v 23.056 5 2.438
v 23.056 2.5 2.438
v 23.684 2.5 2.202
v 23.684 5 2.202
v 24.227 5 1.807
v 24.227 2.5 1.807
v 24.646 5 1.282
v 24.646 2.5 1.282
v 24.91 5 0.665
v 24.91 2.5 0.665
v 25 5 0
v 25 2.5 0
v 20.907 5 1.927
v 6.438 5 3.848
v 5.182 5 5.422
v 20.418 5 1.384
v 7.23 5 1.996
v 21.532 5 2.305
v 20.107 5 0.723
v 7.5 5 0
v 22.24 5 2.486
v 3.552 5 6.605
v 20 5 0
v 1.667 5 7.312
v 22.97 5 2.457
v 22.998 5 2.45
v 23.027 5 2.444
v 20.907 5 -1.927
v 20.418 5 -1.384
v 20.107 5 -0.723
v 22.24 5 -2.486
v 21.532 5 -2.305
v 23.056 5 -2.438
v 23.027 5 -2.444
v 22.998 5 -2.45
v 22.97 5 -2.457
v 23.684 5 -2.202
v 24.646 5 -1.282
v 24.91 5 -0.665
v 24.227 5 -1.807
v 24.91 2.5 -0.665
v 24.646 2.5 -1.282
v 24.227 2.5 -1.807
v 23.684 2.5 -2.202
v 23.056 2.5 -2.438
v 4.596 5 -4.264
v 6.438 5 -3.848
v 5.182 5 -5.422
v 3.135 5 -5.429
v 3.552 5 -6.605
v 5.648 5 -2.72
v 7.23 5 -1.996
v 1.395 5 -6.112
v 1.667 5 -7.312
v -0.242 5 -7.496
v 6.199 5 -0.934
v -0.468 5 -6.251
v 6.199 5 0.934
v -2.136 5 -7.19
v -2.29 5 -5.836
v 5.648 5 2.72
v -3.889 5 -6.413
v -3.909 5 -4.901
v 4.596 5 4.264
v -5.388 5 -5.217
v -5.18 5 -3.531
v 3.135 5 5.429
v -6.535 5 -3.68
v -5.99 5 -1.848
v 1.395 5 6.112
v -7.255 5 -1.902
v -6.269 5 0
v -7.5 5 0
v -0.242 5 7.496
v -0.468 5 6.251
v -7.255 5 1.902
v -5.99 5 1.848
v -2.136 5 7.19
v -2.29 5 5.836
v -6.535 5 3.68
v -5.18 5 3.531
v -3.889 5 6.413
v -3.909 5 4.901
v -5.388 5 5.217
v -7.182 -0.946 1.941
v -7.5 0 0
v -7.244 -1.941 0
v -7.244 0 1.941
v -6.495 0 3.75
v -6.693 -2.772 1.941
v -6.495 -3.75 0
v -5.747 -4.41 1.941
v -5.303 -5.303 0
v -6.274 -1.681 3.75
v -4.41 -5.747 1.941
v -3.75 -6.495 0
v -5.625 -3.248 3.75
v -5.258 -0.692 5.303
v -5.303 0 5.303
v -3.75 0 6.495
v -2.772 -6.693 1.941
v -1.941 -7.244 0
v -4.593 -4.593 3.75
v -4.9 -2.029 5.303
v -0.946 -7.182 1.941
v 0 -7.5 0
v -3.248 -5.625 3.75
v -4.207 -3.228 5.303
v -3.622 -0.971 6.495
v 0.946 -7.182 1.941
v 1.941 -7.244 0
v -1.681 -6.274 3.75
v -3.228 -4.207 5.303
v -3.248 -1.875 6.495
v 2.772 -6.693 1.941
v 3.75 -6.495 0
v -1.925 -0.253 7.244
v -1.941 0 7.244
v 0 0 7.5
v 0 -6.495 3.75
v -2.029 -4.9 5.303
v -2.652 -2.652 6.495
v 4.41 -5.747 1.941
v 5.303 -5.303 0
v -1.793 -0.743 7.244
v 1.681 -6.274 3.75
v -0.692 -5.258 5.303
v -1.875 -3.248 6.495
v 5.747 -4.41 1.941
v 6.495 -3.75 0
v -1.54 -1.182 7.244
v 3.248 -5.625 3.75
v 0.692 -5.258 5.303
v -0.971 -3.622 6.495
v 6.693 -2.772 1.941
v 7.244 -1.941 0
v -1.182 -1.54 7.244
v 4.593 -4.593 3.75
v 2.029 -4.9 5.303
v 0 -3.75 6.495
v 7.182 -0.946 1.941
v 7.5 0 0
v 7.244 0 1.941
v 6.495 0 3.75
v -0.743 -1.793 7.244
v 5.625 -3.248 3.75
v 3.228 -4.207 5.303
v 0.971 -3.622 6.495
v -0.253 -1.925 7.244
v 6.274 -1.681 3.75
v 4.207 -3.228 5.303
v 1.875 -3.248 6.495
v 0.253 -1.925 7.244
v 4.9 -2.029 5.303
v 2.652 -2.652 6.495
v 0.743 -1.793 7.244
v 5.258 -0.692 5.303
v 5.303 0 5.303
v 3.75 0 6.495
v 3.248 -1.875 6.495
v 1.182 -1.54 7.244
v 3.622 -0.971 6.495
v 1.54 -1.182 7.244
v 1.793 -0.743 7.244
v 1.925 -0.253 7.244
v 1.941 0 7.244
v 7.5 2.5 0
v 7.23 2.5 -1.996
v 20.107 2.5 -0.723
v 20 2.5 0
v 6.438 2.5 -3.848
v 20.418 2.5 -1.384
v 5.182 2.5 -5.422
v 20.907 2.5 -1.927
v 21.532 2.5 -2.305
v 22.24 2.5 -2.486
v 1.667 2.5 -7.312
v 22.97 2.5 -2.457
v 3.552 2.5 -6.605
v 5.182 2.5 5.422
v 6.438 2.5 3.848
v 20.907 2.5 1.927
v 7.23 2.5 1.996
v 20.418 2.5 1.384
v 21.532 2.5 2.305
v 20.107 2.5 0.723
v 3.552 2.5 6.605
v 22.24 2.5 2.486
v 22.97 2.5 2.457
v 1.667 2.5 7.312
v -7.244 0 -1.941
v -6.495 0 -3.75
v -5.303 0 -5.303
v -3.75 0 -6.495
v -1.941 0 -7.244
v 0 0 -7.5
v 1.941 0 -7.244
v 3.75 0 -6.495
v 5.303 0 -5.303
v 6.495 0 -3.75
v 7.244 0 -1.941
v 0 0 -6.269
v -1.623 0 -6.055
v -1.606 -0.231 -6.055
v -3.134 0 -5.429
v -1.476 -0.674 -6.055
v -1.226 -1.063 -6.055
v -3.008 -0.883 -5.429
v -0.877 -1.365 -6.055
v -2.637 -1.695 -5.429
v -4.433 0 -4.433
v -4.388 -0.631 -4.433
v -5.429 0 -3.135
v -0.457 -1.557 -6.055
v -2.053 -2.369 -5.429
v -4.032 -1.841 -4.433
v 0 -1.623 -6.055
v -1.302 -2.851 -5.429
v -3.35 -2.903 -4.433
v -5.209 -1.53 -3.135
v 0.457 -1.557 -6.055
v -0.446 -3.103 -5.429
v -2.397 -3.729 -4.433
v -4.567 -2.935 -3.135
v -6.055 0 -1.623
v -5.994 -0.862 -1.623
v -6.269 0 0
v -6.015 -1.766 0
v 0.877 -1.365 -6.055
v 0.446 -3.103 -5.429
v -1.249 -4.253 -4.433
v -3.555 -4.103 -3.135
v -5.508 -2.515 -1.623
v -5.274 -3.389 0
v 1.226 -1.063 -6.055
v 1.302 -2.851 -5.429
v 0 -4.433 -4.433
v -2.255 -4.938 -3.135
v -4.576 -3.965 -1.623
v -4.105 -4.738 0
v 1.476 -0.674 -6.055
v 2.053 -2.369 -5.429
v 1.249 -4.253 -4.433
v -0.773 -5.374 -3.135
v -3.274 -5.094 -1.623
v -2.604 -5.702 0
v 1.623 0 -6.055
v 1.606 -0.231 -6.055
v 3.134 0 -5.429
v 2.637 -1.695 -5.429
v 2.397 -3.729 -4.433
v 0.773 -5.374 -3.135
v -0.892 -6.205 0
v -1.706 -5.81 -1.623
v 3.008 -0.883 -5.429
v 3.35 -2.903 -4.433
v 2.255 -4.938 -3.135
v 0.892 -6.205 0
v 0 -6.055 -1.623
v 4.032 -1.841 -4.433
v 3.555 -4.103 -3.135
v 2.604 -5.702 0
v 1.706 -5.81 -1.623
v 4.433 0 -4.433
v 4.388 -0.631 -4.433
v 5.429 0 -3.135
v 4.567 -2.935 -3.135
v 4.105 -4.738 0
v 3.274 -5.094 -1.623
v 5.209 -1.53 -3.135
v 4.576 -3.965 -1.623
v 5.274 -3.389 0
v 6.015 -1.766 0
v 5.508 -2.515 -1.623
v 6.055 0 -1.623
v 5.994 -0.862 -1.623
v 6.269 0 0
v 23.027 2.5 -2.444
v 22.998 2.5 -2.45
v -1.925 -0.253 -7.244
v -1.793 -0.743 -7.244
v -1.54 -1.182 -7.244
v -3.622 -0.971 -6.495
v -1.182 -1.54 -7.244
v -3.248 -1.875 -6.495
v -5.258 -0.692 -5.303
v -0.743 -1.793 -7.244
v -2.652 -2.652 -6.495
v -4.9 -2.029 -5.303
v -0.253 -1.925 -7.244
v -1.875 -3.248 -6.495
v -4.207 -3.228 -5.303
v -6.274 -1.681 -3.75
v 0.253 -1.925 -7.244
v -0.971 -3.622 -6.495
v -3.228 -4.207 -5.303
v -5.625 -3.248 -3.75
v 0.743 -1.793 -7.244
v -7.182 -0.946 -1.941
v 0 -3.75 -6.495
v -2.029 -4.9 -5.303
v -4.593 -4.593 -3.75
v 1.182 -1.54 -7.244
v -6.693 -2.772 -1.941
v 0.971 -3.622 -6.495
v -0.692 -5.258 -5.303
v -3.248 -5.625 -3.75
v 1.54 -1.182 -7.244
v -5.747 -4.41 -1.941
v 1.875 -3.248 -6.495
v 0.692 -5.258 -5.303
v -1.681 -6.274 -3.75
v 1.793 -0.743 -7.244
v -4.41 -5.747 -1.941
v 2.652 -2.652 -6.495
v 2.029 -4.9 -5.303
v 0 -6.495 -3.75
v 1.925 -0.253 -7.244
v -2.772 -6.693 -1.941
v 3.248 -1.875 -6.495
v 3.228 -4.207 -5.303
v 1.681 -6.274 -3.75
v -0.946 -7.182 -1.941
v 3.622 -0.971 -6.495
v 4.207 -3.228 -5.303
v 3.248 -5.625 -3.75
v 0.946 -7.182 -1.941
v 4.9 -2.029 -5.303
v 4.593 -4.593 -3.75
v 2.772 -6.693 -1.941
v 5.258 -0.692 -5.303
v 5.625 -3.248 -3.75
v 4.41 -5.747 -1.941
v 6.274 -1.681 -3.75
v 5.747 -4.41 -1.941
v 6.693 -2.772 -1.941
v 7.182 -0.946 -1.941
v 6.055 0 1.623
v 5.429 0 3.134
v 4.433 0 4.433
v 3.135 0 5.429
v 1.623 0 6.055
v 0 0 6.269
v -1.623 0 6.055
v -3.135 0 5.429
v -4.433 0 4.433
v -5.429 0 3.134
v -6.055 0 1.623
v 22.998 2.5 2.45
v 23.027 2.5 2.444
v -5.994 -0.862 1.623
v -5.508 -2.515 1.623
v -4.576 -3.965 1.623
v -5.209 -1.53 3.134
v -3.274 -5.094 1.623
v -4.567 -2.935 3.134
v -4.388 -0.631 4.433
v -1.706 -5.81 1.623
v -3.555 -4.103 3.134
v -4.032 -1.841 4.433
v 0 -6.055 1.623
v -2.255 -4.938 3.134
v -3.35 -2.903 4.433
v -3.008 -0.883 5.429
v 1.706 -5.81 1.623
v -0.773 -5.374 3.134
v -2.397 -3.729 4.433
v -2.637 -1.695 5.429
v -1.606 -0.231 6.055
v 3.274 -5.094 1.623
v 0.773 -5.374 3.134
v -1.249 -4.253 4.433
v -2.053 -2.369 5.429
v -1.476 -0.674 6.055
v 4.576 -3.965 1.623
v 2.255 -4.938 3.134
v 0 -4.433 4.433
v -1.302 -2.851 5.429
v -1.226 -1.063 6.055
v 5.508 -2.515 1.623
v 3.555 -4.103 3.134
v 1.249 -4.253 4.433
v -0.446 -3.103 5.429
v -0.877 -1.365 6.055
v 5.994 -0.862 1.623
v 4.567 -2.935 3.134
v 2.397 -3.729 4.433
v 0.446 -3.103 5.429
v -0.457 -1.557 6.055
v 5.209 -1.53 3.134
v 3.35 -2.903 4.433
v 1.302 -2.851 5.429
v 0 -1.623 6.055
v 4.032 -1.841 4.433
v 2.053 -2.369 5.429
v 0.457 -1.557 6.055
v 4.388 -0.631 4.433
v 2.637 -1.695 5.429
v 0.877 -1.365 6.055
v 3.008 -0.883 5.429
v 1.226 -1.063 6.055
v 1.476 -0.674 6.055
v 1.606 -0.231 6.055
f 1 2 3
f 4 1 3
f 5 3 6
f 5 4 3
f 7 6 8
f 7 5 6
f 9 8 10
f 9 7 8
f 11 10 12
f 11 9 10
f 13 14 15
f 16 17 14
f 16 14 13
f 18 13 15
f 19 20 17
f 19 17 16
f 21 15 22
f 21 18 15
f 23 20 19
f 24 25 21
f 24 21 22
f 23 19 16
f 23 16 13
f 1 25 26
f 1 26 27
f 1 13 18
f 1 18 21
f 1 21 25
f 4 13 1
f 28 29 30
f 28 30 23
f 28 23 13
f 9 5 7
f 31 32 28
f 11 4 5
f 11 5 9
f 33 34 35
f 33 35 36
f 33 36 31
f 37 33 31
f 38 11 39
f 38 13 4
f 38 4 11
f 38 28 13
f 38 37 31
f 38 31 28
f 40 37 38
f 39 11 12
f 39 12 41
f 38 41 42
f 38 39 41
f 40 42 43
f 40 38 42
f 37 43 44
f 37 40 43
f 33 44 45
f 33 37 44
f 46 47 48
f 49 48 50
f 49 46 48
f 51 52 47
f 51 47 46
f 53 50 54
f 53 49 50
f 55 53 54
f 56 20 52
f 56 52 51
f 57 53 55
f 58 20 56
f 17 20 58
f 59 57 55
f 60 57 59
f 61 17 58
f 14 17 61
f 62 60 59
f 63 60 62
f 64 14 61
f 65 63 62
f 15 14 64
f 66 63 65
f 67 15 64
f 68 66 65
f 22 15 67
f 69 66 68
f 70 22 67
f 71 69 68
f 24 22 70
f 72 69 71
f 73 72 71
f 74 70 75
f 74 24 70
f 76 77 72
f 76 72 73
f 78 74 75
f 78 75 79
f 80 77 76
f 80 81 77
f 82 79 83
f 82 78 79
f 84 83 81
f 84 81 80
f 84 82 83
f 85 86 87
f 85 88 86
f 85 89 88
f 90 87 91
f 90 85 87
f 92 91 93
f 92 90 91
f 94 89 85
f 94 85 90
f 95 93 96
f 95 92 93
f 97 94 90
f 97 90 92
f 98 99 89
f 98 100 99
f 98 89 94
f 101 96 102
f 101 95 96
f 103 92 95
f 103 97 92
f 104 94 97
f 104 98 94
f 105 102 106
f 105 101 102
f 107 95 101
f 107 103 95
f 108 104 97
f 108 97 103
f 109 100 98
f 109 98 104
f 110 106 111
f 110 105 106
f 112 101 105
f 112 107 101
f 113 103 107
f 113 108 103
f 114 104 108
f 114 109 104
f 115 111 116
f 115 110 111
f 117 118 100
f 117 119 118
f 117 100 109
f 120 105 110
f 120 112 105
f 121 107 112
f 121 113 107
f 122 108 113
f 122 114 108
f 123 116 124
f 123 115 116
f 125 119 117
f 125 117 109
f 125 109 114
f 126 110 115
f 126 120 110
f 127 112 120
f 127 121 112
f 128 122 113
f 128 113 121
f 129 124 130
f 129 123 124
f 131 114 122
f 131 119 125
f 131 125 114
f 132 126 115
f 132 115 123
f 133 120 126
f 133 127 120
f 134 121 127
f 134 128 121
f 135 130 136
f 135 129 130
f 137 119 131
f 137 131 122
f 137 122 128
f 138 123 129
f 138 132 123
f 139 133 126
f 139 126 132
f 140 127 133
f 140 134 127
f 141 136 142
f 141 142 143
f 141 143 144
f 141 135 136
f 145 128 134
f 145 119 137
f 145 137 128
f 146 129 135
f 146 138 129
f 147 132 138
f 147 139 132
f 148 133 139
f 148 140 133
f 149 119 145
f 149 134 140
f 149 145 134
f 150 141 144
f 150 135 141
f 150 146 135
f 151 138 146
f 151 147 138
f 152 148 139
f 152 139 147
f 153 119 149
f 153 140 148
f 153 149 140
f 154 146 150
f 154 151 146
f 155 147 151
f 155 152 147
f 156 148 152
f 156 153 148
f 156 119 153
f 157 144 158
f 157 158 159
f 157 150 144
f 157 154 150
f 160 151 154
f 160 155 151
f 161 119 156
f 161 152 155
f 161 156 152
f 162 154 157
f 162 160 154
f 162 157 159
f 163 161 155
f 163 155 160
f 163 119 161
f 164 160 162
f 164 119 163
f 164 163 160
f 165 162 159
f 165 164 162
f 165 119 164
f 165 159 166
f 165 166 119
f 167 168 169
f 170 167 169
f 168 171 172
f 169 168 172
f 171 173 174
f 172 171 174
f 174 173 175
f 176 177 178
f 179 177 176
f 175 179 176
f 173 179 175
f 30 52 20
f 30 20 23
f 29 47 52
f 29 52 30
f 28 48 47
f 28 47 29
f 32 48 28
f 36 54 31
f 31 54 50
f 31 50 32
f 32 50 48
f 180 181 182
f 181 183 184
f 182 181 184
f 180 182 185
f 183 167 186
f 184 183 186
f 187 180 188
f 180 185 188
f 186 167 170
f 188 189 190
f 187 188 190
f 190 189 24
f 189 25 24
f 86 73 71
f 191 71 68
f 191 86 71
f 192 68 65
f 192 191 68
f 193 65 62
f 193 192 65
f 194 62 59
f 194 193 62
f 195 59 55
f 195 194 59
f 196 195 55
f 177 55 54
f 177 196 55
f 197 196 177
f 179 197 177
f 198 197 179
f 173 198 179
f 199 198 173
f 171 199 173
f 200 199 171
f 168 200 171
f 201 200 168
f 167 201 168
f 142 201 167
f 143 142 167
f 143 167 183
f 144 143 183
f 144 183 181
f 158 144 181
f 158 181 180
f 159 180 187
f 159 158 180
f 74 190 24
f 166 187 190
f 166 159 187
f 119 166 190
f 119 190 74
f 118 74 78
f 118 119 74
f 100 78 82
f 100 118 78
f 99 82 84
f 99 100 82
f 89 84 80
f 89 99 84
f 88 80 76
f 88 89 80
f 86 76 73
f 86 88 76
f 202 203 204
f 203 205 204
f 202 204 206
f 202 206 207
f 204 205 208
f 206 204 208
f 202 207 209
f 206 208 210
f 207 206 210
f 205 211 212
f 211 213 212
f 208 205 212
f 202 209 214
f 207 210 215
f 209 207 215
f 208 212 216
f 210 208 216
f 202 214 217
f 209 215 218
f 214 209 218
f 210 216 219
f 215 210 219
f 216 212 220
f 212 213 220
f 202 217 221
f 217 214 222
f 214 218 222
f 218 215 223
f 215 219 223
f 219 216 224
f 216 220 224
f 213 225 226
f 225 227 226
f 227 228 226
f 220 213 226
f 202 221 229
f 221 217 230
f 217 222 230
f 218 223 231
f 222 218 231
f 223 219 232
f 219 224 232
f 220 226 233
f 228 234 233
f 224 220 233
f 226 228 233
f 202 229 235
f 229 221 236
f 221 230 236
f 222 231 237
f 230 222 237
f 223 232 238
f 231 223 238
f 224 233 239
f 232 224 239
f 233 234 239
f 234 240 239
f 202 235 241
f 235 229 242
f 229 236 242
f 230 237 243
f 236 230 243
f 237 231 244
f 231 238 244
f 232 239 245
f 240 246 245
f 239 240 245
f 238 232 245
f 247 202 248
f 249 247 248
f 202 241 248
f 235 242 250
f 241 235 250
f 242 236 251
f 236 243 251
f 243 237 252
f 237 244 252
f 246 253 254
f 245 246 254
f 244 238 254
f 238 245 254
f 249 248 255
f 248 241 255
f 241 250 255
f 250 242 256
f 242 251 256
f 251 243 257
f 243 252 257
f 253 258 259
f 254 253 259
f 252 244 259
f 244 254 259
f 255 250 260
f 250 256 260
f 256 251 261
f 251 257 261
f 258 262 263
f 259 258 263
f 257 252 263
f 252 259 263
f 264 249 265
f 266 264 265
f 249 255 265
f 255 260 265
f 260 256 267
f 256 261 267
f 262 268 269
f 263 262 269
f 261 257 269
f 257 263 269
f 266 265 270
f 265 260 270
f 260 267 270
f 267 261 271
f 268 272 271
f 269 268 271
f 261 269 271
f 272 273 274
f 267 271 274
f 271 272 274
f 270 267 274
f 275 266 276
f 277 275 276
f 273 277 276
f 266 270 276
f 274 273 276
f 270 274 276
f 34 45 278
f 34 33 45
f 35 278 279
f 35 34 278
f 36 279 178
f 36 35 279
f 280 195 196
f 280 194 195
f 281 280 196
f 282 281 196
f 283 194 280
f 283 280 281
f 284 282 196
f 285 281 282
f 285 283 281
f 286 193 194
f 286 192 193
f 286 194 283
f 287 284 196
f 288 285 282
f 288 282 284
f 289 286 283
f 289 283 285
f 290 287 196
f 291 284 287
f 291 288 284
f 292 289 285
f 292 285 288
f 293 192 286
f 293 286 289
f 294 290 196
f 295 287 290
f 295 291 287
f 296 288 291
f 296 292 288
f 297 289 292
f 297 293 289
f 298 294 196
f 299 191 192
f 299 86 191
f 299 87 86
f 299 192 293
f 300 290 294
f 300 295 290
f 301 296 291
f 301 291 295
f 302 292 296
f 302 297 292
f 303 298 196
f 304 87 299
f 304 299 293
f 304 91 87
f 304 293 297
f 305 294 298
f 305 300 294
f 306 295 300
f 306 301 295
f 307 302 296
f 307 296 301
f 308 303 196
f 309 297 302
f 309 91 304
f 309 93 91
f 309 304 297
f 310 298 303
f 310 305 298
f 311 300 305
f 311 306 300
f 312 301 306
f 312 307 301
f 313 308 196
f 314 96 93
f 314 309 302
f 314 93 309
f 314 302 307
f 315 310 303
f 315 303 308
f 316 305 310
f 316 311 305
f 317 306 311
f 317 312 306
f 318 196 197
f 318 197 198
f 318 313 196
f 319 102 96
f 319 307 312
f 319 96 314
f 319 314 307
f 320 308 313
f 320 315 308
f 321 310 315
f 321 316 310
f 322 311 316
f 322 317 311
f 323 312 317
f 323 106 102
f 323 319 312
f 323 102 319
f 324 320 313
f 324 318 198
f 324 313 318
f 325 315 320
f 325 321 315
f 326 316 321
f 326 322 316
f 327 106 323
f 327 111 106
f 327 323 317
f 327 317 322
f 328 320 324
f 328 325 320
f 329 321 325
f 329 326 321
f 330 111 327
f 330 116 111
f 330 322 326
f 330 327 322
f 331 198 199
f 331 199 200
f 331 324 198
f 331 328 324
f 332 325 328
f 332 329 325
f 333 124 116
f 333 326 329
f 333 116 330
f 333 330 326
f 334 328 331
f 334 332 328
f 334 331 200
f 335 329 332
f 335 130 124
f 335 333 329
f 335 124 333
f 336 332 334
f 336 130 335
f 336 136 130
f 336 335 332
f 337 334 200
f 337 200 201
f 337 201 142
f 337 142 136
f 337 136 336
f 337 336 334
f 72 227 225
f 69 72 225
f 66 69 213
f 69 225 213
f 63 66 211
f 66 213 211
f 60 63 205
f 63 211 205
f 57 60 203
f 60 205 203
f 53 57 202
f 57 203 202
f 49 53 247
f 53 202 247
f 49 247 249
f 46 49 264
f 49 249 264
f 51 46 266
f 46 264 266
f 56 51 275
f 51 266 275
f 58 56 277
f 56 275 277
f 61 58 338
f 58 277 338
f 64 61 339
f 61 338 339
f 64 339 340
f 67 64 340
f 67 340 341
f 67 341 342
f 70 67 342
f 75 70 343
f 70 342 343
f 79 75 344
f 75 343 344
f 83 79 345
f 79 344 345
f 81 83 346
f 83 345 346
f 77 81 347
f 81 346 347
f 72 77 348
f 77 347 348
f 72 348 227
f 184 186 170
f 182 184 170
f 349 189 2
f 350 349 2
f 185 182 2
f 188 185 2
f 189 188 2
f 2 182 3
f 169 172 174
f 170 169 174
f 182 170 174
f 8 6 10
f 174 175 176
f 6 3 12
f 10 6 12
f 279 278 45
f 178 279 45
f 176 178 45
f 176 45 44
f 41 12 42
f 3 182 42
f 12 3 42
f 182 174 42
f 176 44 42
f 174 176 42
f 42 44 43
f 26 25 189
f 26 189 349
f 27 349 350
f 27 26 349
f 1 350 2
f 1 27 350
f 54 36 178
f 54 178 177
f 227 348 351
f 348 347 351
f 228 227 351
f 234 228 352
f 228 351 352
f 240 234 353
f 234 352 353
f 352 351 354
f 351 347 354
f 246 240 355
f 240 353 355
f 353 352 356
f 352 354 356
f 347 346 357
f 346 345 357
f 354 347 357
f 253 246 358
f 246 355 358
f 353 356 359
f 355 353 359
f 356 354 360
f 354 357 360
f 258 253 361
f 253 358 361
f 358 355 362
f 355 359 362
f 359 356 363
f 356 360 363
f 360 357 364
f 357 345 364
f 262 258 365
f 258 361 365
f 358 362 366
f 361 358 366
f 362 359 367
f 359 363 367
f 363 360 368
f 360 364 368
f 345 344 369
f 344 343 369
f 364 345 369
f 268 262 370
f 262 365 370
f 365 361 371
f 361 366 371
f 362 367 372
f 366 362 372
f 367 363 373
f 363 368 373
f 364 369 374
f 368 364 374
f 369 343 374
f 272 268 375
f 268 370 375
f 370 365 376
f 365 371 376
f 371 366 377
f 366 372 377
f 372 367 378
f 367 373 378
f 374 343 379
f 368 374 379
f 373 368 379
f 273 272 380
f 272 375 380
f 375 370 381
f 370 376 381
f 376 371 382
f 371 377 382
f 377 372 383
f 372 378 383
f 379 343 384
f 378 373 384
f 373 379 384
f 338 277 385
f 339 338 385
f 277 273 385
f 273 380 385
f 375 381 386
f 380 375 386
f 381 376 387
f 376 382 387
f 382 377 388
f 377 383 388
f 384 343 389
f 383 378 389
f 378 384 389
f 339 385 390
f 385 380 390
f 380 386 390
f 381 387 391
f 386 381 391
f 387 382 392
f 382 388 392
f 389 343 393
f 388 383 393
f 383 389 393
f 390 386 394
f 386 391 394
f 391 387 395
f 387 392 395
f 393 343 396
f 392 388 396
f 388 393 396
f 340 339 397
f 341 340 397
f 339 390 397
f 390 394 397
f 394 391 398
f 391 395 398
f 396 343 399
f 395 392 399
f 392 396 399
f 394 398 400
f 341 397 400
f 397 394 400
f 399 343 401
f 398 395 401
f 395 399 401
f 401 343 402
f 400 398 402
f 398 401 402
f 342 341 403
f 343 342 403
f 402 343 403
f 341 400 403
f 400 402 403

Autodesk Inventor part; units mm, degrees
ref_plane "YZ Plane" through (0, 0, 0) normal (1, 0, 0) x (0, 1, 0)
ref_plane "XZ Plane" through (0, 0, 0) normal (0, 1, 0) x (-1, 0, 0)
ref_plane "XY Plane" through (0, 0, 0) normal (0, 0, 1) x (1, 0, 0)
sketch "Sketch2" plane through (0, 0, 0) normal (0, 1, 0) x (-1, 0, 0)
  circle A0 centre (0, 0) radius 6.269
  circle A1 centre (0, 0) radius 7.5
  dimension "d0" = 12.538
  dimension "d1" = 15
extrude "Extrusion1" add sketch "Sketch2" along normal blind 5
sketch "Sketch4" plane through (0, 5, 0) normal (0, 1, 0) x (1, 0, 0)
  circle A0 centre (0, 0) radius 7.5 projected
  circle A1 centre (0, 0) radius 6.269 projected
  circle A2 centre (0, 0) radius 7.5 projected
  line L0 (7.5, 0) -> (22.5, 0)
  circle A3 centre (22.5, 0) radius 2.5
  line L1 (22.97, -2.457) -> (1.6667, -7.3125)
  line L2 (22.97, 2.457) -> (1.6667, 7.3125)
  line L3 (22.97, -2.457) -> (23.0556, -2.4375)
  line L4 (22.97, 2.457) -> (23.0556, 2.4375)
  point P0 (22.5114, 2.4471)
  point P1 (1.6667, 7.3125)
  point P2 (1.6667, -7.3125)
  point P3 (22.5114, -2.4471)
  dimension "d11" = 15
  dimension "d12" = 5
extrude "Extrusion3" add sketch "Sketch4" against normal blind 2.5 contours L0 A3 L1 A0 | A0 L2 A3 L0 | A3
sketch "Sketch5" plane through (0, 0, 0) normal (0, -1, 0) x (1, 0, 0)
  circle A0 centre (0, 0) radius 7.5 projected
  circle A1 centre (0, 0) radius 6.269 projected
  line L0 (0, 7.5) -> (0, -7.5)
  circle A2 centre (0, 0) radius 7.5 projected
  point P0 (0, -6.269)
  point P1 (0, -7.5)
  point P2 (0, 6.269)
revolve "Revolution2" add sketch "Sketch5" angle 180 about axis through (0, 0, 7.5) along (0, 0, -1) picked at (6.9746, -1.0213) contours A0 L0 A1
properties part number "powderScoop_3DPrint"
